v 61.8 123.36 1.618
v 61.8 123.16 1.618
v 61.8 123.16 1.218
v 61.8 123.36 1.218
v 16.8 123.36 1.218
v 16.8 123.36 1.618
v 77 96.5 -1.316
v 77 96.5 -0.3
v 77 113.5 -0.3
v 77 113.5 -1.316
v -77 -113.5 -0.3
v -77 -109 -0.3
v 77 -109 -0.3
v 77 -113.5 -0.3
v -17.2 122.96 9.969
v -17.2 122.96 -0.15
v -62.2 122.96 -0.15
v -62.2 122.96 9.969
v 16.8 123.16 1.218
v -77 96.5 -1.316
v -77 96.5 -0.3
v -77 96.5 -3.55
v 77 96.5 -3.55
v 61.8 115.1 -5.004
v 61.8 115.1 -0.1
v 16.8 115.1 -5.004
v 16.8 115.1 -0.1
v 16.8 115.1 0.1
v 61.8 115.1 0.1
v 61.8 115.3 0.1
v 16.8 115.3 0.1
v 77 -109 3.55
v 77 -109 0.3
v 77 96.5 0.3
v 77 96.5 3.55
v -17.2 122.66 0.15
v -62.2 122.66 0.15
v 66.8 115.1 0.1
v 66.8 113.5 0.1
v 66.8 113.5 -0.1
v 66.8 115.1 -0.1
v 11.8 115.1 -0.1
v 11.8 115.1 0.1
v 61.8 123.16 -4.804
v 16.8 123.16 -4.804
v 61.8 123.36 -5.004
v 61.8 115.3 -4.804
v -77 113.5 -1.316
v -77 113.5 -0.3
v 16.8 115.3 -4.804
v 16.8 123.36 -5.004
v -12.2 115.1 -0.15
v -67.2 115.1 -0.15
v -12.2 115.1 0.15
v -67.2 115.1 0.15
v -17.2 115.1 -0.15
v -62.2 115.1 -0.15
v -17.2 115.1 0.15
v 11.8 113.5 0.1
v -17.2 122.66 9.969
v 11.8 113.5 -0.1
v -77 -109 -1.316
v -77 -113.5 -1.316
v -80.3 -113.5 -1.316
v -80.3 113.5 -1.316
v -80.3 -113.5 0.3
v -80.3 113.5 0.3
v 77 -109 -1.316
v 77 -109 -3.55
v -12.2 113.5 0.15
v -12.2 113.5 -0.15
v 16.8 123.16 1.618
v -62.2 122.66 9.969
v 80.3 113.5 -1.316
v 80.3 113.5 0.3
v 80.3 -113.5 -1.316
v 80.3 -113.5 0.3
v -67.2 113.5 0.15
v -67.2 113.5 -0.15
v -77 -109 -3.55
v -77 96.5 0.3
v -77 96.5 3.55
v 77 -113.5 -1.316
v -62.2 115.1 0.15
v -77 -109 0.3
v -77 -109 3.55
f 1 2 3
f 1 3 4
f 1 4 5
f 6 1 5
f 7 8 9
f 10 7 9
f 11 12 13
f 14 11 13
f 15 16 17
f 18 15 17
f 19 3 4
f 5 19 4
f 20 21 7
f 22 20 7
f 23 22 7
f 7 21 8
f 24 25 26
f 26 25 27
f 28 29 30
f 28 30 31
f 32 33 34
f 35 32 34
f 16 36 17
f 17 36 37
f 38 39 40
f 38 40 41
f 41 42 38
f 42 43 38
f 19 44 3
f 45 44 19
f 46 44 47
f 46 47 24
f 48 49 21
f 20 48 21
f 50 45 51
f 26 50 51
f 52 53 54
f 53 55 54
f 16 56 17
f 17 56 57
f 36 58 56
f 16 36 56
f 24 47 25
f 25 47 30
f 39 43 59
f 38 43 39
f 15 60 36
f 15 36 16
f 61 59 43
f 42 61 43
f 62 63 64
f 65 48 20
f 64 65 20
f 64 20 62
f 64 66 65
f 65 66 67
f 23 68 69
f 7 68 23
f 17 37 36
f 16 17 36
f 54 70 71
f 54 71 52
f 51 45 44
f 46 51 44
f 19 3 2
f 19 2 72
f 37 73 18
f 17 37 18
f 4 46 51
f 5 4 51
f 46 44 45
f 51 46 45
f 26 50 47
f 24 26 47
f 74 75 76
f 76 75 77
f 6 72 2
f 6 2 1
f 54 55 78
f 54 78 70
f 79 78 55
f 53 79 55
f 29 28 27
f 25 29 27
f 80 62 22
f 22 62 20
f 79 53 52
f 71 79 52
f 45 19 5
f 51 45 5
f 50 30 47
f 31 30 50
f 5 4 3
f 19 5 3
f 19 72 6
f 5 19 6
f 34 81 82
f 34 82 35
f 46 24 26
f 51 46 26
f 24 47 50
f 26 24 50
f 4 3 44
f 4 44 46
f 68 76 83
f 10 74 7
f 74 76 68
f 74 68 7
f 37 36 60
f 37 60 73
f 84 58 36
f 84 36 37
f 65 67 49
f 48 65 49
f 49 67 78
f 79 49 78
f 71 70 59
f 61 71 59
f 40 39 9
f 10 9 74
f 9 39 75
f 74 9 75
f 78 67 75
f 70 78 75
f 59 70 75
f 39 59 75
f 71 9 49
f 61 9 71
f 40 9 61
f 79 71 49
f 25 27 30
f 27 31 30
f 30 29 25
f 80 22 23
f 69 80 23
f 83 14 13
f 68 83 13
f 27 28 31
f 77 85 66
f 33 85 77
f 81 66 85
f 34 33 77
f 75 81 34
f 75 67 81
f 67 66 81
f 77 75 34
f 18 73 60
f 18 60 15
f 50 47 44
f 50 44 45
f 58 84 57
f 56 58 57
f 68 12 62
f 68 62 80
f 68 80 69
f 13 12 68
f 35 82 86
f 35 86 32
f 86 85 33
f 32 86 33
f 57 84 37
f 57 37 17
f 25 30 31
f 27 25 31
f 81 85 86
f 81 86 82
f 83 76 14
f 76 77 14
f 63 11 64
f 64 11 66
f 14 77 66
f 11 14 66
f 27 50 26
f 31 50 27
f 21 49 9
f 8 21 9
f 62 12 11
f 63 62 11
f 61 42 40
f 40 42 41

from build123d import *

# Parameters (mm, degrees)
SKETCH1_W                    = 160.6
SKETCH1_H                    = 227
INSULATION_DEPTH             = 0.3
INSULATION_DEPTH_BACK        = 0.3
SKETCH2_W                    = 154
SKETCH2_H                    = 205.5
MAIN_BODY_DEPTH              = 3.55
MAIN_BODY_DEPTH_BACK         = 3.55
SIDE_FOLDS_DEPTH             = 1.016
SKETCH6_W                    = 55
SKETCH6_H                    = 18.6
NEGATIVE_TAB_BASE_DEPTH      = 0.1
NEGATIVE_TAB_BASE_DEPTH_BACK = 0.1
SKETCH7_W                    = 55
SKETCH7_H                    = 18.6
POSITIVE_TAB_BASE_DEPTH      = 0.15
POSITIVE_TAB_BASE_DEPTH_BACK = 0.15
SKETCH110_W                  = 0.3
SKETCH110_H                  = 45
POSITIVE_TAB_DEPTH           = 31.210499994
SKETCH110_ON_SEGMENT_2_W     = 0.3
SKETCH110_ON_SEGMENT_2_H     = 45
POSITIVE_TAB_2_DEPTH         = 33.469099994
SKETCH113_W                  = 0.2
SKETCH113_H                  = 45
NEGATIVE_TAB_DEPTH           = 23.600222221
SKETCH113_ON_SEGMENT_2_W     = 0.2
SKETCH113_ON_SEGMENT_2_H     = 45
NEGATIVE_TAB_2_DEPTH         = 51.904294442
SKETCH113_ON_SEGMENT_3_W     = 0.2
SKETCH113_ON_SEGMENT_3_H     = 45
NEGATIVE_TAB_3_DEPTH         = 55.060444442
SKETCH113_ON_SEGMENT_4_W     = 0.2
SKETCH113_ON_SEGMENT_4_H     = 45
NEGATIVE_TAB_4_DEPTH         = 30.622297221
SKETCH113_ON_SEGMENT_5_W     = 0.2
SKETCH113_ON_SEGMENT_5_H     = 45
NEGATIVE_TAB_5_DEPTH         = 1.4


with BuildPart() as part:
    # Sketch1 → Insulation (new, two sides)
    with BuildSketch(Plane.XY) as insulation_sk:
        Rectangle(SKETCH1_W, SKETCH1_H)
    extrude(amount=INSULATION_DEPTH)
    extrude(insulation_sk.sketch, amount=-INSULATION_DEPTH_BACK)

    # Sketch2 → Main Body (add, two sides)
    with BuildSketch(Plane.XY) as main_body_sk:
        with Locations((0, -6.25)):
            Rectangle(SKETCH2_W, SKETCH2_H)
    extrude(amount=MAIN_BODY_DEPTH)
    extrude(main_body_sk.sketch, amount=-MAIN_BODY_DEPTH_BACK)

    # Sketch5 → Side Folds (add)
    with BuildSketch(Plane(origin=(0, 0, -0.3), x_dir=(-1, 0, 0), z_dir=(0, 0, -1))):
        Polygon((-77, -109), (-77, 96.5), (-77, 113.5), (-80.3, 113.5), (-80.3, -113.5), (-77, -113.5), align=None)
        Polygon((77, 113.5), (77, 96.5), (77, -109), (77, -113.5), (80.3, -113.5), (80.3, 113.5), align=None)
    extrude(amount=SIDE_FOLDS_DEPTH)

    # Sketch6 → Negative Tab Base (add, two sides)
    with BuildSketch(Plane.XY) as negative_tab_base_sk:
        with Locations((39.3, 105.8)):
            Rectangle(SKETCH6_W, SKETCH6_H)
    extrude(amount=NEGATIVE_TAB_BASE_DEPTH)
    extrude(negative_tab_base_sk.sketch, amount=-NEGATIVE_TAB_BASE_DEPTH_BACK)

    # Sketch7 → Positive Tab Base (add, two sides)
    with BuildSketch(Plane.XY) as positive_tab_base_sk:
        with Locations((-39.7, 105.8)):
            Rectangle(SKETCH7_W, SKETCH7_H)
    extrude(amount=POSITIVE_TAB_BASE_DEPTH)
    extrude(positive_tab_base_sk.sketch, amount=-POSITIVE_TAB_BASE_DEPTH_BACK)


with BuildPart() as body_2:
    # Sketch110 → Positive Tab (new body)
    with BuildSketch(Plane(origin=(-39.7, 115.1, 0), x_dir=(0, 0, -1), z_dir=(0, 1, 0))):
        Rectangle(SKETCH110_W, SKETCH110_H)
    extrude(amount=POSITIVE_TAB_DEPTH)

    # Positive Tab mitre 1
    split(bisect_by=Plane(origin=(-39.7, 122.81, 0), x_dir=(1, 0, 0), z_dir=(0, -0.707106781, -0.707106781)), keep=Keep.TOP)


with BuildPart() as body_3:
    # Sketch110 on segment 2 (carried to segment 2) → Positive Tab 2 (new body)
    with BuildSketch(Plane(origin=(-39.7, 122.81, -23.500499994), x_dir=(0, 1, 0), z_dir=(0, 0, 1))):
        Rectangle(SKETCH110_ON_SEGMENT_2_W, SKETCH110_ON_SEGMENT_2_H)
    extrude(amount=POSITIVE_TAB_2_DEPTH)

    # Positive Tab 2 mitre 1
    split(bisect_by=Plane(origin=(-39.7, 122.81, 0), x_dir=(-1, 0, 0), z_dir=(0, 0.707106781, 0.707106781)), keep=Keep.TOP)


with BuildPart() as body_4:
    # Sketch113 → Negative Tab (new body)
    with BuildSketch(Plane(origin=(39.3, 115.1, 0), x_dir=(0, 0, -1), z_dir=(0, 1, 0))):
        Rectangle(SKETCH113_W, SKETCH113_H)
    extrude(amount=NEGATIVE_TAB_DEPTH)

    # Negative Tab mitre 1
    split(bisect_by=Plane(origin=(39.3, 115.2, 0), x_dir=(1, 0, 0), z_dir=(0, -0.707106781, 0.707106781)), keep=Keep.TOP)


with BuildPart() as body_5:
    # Sketch113 on segment 2 (carried to segment 2) → Negative Tab 2 (new body)
    with BuildSketch(Plane(origin=(39.3, 115.2, 23.500222221), x_dir=(0, -1, 0), z_dir=(0, 0, -1))):
        Rectangle(SKETCH113_ON_SEGMENT_2_W, SKETCH113_ON_SEGMENT_2_H)
    extrude(amount=NEGATIVE_TAB_2_DEPTH)

    # Negative Tab 2 mitre 1
    split(bisect_by=Plane(origin=(39.3, 115.2, 0), x_dir=(-1, 0, 0), z_dir=(0, 0.707106781, -0.707106781)), keep=Keep.TOP)

    # Negative Tab 2 mitre 2
    split(bisect_by=Plane(origin=(39.3, 115.2, -4.90385), x_dir=(1, 0, 0), z_dir=(0, -0.707106781, 0.707106781)), keep=Keep.TOP)


with BuildPart() as body_6:
    # Sketch113 on segment 3 (carried to segment 3) → Negative Tab 3 (new body)
    with BuildSketch(Plane(origin=(39.3, 91.699777779, -4.90385), x_dir=(0, 0, -1), z_dir=(0, 1, 0))):
        Rectangle(SKETCH113_ON_SEGMENT_3_W, SKETCH113_ON_SEGMENT_3_H)
    extrude(amount=NEGATIVE_TAB_3_DEPTH)

    # Negative Tab 3 mitre 1
    split(bisect_by=Plane(origin=(39.3, 115.2, -4.90385), x_dir=(-1, 0, 0), z_dir=(0, 0.707106781, -0.707106781)), keep=Keep.TOP)

    # Negative Tab 3 mitre 2
    split(bisect_by=Plane(origin=(39.3, 123.26, -4.90385), x_dir=(1, 0, 0), z_dir=(0, -0.707106781, -0.707106781)), keep=Keep.TOP)


with BuildPart() as body_7:
    # Sketch113 on segment 4 (carried to segment 4) → Negative Tab 4 (new body)
    with BuildSketch(Plane(origin=(39.3, 123.26, -28.404072221), x_dir=(0, 1, 0), z_dir=(0, 0, 1))):
        Rectangle(SKETCH113_ON_SEGMENT_4_W, SKETCH113_ON_SEGMENT_4_H)
    extrude(amount=NEGATIVE_TAB_4_DEPTH)

    # Negative Tab 4 mitre 1
    split(bisect_by=Plane(origin=(39.3, 123.26, -4.90385), x_dir=(-1, 0, 0), z_dir=(0, 0.707106781, 0.707106781)), keep=Keep.TOP)

    # Negative Tab 4 mitre 2
    split(bisect_by=Plane(origin=(39.3, 123.26, 1.218225), x_dir=(0, 1, 0), z_dir=(0, 0, -1)), keep=Keep.TOP)


with BuildPart() as body_8:
    # Sketch113 on segment 5 (carried to segment 5) → Negative Tab 5 (new body)
    with BuildSketch(Plane(origin=(39.3, 123.26, 0.218225), x_dir=(0, 1, 0), z_dir=(0, 0, 1))):
        Rectangle(SKETCH113_ON_SEGMENT_5_W, SKETCH113_ON_SEGMENT_5_H)
    extrude(amount=NEGATIVE_TAB_5_DEPTH)

    # Negative Tab 5 mitre 1
    split(bisect_by=Plane(origin=(39.3, 123.26, 1.218225), x_dir=(0, -1, 0), z_dir=(0, 0, 1)), keep=Keep.TOP)


solid = Compound([part.part, body_2.part, body_3.part, body_4.part, body_5.part, body_6.part, body_7.part, body_8.part])
